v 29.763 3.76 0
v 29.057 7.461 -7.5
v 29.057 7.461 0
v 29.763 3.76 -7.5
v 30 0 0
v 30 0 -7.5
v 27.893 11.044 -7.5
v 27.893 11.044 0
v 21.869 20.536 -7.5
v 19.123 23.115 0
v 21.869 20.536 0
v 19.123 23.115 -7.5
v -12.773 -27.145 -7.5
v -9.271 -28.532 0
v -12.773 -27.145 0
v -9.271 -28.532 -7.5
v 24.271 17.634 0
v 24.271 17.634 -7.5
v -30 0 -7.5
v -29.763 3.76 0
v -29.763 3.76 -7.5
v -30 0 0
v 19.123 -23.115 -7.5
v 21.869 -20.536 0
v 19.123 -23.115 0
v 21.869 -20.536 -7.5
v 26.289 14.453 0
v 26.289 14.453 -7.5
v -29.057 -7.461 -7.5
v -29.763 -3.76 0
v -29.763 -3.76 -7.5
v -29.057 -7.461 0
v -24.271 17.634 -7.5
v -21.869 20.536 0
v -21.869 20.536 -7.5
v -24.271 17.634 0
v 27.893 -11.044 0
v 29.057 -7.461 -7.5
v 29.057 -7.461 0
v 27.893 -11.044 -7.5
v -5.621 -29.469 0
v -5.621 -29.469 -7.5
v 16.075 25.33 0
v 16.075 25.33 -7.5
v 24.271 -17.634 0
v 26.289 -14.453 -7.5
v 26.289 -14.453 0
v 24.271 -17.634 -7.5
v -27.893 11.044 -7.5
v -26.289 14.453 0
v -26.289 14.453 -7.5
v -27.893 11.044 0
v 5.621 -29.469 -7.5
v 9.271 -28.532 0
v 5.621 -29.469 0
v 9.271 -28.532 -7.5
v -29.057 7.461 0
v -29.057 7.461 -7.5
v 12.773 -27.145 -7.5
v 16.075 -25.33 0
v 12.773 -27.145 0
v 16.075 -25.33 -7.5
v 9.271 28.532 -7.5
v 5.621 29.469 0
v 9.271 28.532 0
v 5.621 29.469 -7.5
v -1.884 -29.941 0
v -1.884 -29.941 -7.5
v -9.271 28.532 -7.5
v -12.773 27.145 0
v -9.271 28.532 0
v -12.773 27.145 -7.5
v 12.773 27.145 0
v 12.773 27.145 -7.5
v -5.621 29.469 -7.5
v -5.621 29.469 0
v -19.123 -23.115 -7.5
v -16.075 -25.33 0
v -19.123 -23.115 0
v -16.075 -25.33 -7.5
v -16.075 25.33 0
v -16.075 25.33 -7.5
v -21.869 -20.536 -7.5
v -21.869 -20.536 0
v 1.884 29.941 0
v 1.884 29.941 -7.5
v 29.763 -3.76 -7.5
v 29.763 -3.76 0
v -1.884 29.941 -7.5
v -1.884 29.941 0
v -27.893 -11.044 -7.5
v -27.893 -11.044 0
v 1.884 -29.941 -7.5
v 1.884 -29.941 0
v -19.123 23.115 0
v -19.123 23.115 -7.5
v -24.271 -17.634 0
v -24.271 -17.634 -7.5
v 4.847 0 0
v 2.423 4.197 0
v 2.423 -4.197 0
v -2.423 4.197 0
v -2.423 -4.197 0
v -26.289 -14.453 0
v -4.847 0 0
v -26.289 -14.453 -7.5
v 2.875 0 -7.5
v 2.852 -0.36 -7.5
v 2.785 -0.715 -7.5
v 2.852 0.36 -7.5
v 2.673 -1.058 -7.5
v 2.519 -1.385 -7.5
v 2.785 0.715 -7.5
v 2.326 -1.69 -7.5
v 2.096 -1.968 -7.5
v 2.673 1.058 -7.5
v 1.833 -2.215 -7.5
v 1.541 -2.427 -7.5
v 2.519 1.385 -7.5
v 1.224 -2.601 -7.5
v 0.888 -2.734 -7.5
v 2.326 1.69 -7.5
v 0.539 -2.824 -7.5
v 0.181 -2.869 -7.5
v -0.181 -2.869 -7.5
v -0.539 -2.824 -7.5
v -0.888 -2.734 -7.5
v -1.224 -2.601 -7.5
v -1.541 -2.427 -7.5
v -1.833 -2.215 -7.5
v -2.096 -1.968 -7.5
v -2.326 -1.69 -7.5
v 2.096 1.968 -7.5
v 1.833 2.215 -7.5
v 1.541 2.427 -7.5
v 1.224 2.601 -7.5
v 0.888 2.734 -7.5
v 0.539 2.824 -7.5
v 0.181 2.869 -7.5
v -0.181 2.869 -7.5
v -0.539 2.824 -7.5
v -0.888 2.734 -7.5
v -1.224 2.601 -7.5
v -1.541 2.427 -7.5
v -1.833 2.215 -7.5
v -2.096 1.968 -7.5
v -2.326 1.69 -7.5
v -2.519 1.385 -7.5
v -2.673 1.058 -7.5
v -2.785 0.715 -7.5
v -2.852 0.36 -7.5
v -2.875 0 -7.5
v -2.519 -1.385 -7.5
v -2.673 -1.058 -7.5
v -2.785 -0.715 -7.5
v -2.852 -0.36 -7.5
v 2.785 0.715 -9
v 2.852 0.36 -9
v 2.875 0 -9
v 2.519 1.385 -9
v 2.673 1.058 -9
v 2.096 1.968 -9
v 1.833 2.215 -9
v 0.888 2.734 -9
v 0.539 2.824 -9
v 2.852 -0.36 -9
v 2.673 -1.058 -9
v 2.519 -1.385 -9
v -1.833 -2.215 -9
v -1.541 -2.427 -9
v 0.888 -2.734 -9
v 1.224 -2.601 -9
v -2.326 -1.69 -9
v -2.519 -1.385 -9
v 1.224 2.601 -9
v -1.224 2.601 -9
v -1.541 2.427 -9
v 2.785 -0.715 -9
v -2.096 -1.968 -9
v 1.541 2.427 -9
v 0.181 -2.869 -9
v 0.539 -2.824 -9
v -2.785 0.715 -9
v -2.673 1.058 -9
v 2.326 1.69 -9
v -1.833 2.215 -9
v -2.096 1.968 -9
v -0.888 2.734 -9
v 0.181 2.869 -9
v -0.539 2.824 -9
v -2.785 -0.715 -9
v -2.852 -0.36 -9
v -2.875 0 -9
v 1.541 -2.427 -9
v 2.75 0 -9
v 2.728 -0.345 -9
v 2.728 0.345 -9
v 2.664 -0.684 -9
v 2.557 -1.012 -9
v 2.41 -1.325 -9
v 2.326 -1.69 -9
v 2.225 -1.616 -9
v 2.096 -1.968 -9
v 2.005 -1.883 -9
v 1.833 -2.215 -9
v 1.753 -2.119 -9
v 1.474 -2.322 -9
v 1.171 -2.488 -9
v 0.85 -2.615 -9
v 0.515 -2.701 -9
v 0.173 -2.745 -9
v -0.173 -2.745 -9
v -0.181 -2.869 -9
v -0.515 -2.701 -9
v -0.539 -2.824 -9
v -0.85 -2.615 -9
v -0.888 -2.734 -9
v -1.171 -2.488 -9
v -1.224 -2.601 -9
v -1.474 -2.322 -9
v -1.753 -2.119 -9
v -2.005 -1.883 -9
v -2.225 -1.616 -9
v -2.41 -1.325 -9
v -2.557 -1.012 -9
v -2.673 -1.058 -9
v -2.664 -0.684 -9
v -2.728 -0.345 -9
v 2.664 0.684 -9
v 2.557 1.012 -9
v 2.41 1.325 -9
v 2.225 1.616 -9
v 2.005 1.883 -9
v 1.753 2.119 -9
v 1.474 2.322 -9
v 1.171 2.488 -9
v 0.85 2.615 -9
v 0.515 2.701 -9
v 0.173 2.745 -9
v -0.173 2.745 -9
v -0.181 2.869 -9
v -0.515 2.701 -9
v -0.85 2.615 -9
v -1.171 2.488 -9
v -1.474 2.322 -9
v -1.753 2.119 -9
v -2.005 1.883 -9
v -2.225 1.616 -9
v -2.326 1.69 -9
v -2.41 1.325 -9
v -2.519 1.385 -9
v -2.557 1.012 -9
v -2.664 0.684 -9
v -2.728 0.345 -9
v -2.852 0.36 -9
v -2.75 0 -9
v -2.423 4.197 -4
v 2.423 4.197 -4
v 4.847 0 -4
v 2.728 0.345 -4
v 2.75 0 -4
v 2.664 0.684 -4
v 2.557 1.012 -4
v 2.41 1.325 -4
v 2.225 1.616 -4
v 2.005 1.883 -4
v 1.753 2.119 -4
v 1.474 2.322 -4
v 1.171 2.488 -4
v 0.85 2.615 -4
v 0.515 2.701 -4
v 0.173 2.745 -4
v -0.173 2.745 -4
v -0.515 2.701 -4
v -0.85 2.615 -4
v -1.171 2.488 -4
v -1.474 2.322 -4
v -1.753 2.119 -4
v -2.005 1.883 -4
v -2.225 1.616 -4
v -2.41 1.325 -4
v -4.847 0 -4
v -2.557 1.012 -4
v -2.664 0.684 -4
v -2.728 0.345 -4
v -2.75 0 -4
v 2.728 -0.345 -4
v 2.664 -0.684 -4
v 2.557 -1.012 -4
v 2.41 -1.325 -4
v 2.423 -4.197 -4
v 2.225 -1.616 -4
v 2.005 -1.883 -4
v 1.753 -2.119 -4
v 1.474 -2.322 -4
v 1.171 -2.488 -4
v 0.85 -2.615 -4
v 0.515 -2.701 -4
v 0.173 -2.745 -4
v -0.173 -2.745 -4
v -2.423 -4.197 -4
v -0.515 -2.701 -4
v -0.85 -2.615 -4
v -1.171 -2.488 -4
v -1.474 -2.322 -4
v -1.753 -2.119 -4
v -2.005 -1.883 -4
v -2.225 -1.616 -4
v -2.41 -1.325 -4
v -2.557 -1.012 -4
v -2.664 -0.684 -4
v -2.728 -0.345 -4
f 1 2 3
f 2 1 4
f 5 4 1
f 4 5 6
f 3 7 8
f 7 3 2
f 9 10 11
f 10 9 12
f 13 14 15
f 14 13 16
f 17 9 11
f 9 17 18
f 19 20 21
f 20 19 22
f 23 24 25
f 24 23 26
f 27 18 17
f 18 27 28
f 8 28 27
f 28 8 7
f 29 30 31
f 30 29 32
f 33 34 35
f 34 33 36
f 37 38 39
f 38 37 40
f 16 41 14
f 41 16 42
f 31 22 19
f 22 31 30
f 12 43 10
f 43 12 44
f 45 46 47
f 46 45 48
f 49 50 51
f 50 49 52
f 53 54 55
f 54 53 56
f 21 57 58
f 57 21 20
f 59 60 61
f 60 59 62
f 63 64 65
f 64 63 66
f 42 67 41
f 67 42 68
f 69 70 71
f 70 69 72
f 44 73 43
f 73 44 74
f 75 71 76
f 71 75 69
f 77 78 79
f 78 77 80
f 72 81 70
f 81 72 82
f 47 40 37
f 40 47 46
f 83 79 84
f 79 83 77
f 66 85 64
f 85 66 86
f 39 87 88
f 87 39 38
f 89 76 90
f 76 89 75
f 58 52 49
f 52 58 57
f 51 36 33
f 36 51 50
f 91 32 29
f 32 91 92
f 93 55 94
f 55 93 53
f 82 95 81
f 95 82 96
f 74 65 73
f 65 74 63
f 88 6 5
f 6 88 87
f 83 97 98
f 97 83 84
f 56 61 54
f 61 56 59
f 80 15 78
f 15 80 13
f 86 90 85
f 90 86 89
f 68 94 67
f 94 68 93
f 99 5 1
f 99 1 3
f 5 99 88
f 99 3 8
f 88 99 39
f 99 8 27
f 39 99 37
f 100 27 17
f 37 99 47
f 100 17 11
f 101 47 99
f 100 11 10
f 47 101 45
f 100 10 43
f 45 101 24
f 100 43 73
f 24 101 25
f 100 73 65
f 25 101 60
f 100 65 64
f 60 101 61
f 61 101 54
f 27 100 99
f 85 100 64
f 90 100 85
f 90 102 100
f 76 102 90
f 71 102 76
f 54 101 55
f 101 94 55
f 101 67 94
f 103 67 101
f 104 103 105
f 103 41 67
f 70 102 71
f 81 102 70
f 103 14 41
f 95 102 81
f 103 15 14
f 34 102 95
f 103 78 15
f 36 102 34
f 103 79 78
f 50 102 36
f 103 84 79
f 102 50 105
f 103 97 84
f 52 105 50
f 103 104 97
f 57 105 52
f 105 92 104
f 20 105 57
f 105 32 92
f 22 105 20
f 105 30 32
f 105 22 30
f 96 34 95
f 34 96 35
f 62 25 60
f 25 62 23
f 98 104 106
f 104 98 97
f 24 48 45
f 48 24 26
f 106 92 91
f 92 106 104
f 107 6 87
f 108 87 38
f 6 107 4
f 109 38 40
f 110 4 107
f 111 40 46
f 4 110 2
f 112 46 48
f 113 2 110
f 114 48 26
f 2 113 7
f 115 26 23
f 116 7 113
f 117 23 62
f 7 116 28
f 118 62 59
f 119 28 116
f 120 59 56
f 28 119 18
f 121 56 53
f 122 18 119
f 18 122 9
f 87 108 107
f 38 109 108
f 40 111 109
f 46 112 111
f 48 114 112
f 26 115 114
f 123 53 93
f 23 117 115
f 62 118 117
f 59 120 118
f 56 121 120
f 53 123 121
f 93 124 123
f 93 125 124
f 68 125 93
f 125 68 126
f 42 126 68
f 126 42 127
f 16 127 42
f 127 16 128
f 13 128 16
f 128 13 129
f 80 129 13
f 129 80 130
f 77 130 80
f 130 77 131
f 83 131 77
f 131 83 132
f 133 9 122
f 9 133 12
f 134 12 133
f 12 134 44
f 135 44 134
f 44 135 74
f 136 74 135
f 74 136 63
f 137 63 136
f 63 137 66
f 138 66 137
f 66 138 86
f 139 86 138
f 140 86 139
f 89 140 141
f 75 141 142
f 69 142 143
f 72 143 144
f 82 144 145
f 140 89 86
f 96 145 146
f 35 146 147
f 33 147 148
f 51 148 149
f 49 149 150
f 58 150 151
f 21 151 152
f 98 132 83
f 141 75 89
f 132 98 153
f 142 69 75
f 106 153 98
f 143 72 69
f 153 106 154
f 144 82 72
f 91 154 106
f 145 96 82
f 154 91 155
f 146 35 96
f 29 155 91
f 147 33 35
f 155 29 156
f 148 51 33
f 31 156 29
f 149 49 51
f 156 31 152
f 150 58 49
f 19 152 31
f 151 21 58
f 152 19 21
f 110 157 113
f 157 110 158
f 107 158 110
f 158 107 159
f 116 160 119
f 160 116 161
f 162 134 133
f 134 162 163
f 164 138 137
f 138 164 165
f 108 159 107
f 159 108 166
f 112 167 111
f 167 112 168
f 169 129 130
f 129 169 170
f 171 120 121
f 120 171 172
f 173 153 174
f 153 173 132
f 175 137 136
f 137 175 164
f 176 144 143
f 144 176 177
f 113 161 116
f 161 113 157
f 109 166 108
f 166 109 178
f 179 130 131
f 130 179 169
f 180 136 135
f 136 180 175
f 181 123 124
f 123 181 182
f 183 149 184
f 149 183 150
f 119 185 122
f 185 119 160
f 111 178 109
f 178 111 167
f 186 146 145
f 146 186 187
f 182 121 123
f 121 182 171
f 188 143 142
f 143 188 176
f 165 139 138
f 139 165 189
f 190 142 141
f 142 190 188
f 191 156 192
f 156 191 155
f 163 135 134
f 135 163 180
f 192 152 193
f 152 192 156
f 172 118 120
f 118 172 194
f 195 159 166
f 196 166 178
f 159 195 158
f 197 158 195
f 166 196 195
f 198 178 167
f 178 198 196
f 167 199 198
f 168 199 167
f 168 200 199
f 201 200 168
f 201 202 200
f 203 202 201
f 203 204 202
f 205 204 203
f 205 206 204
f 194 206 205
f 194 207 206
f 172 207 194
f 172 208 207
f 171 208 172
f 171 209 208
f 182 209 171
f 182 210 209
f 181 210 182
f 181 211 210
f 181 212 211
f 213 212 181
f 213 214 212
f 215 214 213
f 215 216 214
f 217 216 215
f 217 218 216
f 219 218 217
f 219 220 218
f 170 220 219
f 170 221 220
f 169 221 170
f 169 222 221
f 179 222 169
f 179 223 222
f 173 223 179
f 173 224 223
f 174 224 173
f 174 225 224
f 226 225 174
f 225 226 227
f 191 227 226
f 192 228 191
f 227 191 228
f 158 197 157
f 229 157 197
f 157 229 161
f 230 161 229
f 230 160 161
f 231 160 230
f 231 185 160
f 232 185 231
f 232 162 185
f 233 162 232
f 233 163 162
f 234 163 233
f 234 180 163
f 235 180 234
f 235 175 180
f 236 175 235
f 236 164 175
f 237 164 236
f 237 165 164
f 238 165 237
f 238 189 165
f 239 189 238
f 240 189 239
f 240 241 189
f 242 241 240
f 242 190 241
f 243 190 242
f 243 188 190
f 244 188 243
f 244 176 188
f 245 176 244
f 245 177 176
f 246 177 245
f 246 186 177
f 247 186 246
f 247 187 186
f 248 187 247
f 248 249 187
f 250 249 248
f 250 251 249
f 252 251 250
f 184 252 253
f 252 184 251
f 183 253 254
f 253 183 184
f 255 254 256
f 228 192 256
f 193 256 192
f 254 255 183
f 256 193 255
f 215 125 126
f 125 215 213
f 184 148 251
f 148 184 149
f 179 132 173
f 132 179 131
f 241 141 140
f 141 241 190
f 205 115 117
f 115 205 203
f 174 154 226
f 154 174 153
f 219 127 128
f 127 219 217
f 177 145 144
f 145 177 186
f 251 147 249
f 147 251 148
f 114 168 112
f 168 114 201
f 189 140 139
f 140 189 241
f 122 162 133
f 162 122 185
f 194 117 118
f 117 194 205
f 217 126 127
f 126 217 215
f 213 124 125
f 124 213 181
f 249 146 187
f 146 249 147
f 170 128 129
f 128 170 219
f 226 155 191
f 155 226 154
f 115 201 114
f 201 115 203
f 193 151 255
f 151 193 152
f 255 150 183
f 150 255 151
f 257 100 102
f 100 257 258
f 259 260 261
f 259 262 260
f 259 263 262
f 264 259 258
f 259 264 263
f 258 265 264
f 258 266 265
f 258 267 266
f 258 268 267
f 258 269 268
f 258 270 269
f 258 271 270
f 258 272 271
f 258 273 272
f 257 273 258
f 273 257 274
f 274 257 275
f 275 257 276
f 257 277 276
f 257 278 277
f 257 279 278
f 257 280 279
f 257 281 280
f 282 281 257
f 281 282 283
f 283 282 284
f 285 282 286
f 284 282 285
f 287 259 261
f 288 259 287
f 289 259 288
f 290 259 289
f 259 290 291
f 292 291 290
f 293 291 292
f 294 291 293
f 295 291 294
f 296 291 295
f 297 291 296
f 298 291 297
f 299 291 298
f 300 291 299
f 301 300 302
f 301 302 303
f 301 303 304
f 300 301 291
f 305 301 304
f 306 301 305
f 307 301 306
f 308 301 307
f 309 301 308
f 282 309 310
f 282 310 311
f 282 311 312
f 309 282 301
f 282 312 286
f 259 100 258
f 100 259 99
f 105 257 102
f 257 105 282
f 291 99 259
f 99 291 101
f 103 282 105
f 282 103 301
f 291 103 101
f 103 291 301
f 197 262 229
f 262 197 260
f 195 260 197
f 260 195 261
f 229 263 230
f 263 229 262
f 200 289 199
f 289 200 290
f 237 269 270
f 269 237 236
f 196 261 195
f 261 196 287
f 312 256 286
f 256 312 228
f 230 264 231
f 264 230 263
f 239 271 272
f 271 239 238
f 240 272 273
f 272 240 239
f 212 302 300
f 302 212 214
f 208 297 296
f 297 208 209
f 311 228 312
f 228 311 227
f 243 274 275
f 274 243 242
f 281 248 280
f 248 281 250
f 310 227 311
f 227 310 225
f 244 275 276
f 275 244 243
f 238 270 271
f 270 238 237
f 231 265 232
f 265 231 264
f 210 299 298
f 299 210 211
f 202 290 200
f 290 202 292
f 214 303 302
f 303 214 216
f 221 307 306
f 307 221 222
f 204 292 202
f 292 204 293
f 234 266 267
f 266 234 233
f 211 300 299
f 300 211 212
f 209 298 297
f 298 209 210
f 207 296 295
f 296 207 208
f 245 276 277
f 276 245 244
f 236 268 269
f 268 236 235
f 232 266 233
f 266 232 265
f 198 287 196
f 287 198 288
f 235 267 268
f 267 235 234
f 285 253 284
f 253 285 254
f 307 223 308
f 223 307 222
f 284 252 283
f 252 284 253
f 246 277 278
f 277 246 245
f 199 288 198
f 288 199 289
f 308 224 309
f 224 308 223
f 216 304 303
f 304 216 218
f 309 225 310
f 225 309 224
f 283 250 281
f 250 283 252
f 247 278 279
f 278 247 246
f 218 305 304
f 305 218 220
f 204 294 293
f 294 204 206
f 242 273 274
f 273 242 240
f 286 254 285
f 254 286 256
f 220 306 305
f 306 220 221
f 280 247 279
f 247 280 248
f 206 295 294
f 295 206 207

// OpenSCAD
$fn = 50;

difference() {
	union() {
		translate(v = [0, 0, -7.5]) {
			cylinder(h = 7.5, r = 30.0);
		}
		#translate(v = [0, 0, -9.0]) {
			cylinder(h = 9, r = 2.875);
		}
	}
	union() {
		translate(v = [0, 0, 0]) {
			rotate(a = [0, 0, 0]) {
				difference() {
					union() {
						translate(v = [0, 0, -4]) {
							linear_extrude(height = 4) {
								polygon(points = [[4.8468, 0.0], [2.4234000000000004, 4.197451927062417], [-2.423399999999999, 4.197451927062417], [-4.8468, 5.935618106107392e-16], [-2.423400000000002, -4.197451927062416], [2.423399999999997, -4.197451927062419]]);
							}
						}
					}
					union();
				}
			}
		}
		#translate(v = [0, 0, -100.0]) {
			cylinder(h = 200, r = 2.75);
		}
	}
}
